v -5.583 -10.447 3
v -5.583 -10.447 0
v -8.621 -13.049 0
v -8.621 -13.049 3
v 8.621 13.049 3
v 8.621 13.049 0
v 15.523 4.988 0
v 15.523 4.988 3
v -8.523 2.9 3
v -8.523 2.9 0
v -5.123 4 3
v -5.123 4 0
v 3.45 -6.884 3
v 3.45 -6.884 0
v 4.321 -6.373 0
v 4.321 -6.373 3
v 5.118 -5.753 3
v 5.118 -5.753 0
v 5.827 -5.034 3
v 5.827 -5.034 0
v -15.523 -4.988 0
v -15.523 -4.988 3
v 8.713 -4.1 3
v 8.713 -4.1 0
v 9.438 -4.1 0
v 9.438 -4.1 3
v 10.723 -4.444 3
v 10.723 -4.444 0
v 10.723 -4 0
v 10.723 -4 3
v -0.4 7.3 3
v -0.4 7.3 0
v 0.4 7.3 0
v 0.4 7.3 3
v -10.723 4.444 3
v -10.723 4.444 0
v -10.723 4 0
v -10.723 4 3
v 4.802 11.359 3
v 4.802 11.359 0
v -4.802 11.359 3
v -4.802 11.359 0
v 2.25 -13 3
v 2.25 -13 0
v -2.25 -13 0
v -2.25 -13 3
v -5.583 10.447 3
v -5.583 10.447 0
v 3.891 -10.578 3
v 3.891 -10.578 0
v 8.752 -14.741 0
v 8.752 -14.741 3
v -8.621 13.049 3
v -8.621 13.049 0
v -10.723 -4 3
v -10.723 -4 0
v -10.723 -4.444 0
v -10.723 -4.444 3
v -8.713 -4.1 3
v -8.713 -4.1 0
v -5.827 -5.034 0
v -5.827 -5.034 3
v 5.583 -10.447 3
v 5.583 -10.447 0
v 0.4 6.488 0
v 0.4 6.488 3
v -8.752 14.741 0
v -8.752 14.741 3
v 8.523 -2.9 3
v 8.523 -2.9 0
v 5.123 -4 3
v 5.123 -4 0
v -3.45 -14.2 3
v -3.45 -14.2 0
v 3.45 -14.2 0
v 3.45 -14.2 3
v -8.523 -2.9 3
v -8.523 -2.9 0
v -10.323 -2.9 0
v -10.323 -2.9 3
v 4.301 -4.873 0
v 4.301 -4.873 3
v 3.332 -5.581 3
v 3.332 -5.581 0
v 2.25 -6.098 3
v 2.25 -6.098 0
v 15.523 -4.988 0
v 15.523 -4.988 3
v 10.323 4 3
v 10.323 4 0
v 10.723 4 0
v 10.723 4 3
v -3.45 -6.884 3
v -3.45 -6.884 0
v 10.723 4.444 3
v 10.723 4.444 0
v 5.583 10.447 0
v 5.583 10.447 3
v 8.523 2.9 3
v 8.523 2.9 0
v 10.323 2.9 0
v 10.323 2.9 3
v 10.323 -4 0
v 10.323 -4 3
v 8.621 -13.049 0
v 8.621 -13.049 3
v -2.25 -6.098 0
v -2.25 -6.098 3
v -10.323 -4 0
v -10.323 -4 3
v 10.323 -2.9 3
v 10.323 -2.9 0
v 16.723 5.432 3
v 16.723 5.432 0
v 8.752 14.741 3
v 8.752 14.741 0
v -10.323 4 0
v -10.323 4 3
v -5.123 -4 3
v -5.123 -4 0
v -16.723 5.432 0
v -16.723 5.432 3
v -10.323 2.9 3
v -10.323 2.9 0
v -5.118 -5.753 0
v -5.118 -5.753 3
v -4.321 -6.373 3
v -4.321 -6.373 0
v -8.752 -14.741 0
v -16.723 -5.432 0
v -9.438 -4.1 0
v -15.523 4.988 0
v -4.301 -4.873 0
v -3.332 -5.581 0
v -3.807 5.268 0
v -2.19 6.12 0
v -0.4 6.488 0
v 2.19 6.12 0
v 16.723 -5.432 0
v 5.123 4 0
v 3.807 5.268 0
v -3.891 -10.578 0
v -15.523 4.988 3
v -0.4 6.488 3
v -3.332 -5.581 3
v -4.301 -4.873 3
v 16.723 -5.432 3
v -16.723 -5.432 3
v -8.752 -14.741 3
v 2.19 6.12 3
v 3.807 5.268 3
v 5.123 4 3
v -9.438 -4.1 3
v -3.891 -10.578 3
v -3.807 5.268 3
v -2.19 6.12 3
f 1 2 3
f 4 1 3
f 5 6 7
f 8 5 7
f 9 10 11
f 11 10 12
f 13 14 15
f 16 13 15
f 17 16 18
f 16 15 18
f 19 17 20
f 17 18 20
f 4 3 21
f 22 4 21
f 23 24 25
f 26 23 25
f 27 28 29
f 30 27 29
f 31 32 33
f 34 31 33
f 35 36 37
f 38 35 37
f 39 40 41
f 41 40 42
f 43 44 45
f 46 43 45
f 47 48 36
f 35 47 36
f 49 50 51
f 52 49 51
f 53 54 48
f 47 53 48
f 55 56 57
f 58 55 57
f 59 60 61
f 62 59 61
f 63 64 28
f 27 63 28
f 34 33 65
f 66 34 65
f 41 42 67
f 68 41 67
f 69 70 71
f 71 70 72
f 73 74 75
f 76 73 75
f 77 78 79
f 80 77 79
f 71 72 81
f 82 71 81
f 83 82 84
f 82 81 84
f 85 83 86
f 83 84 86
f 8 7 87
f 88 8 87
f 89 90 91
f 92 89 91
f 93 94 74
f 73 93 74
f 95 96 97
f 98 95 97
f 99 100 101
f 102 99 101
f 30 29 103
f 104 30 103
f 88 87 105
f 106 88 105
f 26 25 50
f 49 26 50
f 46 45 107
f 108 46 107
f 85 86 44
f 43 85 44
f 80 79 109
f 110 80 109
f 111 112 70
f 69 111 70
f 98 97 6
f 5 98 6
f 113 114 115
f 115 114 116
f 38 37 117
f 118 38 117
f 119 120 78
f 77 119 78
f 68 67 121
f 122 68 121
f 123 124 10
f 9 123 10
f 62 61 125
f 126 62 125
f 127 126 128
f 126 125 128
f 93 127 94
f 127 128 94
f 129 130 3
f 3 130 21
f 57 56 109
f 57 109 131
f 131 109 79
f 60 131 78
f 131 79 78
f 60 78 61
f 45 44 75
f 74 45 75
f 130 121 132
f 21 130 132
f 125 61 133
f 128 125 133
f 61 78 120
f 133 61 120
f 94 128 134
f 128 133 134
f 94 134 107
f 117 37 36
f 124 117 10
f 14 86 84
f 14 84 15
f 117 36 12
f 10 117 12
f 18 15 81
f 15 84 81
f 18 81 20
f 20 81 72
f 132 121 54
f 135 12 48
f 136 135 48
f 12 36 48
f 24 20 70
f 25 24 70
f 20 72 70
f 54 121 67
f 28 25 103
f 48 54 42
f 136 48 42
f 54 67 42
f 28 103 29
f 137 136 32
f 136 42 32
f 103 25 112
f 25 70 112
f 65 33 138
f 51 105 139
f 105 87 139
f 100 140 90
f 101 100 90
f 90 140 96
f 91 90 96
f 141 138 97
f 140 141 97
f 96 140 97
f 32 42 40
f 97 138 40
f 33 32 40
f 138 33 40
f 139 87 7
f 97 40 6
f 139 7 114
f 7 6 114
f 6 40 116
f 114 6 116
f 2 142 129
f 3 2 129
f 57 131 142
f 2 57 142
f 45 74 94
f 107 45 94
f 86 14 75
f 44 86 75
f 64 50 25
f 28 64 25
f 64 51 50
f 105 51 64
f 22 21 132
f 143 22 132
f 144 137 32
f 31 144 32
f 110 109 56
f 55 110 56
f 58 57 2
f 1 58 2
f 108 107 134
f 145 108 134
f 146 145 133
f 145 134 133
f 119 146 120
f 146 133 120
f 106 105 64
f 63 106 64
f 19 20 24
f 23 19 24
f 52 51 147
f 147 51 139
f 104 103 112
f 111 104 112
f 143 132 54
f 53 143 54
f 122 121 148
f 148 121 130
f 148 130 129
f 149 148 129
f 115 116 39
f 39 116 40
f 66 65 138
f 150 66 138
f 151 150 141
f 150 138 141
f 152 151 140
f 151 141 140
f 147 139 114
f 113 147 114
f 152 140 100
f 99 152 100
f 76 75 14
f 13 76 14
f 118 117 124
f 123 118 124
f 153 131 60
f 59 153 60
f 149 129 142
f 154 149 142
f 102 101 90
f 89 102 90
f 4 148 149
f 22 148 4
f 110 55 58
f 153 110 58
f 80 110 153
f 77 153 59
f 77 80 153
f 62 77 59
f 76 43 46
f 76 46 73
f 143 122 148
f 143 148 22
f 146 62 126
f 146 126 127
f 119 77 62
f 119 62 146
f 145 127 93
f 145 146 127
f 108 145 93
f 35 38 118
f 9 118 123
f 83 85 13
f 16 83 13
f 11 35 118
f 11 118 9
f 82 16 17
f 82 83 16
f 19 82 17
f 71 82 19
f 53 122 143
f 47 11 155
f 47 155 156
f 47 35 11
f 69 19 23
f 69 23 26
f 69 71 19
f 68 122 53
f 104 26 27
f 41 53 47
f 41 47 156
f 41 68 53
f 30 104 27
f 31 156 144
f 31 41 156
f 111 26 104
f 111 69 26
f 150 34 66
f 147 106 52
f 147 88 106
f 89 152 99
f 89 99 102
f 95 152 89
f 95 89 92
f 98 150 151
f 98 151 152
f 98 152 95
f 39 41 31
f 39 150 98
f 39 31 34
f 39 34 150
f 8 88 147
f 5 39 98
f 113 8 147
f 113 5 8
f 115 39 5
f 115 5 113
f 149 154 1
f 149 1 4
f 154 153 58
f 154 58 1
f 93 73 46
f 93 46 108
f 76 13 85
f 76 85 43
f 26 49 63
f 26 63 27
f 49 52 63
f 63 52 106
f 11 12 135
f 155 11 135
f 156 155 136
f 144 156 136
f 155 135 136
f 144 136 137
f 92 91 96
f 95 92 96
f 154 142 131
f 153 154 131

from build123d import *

# Parameters (mm, degrees)
F1_DEPTH = 3


with BuildPart() as f1:
    # F0 (on Top) → F1 (new body)
    with BuildSketch(Plane.XY):
        with BuildLine():
            Line((16.723475, 5.431714), (8.751905, 14.74098))
            Line((8.751905, 14.74098), (4.802136, 11.358773))
            Line((4.802136, 11.358773), (-4.802136, 11.358773))
            Line((-4.802136, 11.358773), (-8.751905, 14.740979))
            Line((-8.751905, 14.740979), (-16.723475, 5.431713))
            Line((-16.723475, 5.431713), (-16.723475, 0))
            Line((-16.723475, 0), (-16.723475, -5.431713))
            Line((-16.723475, -5.431713), (-8.751905, -14.740979))
            Line((-8.751905, -14.740979), (-3.890651, -10.578264))
            Line((-3.890651, -10.578264), (-9.43802, -4.1))
            Line((-9.43802, -4.1), (-8.712763, -4.1))
            Line((-8.712763, -4.1), (-5.826839, -5.033681))
            ThreePointArc((-5.826839, -5.033681), (-4.72977, -6.076123), (-3.45, -6.883858))
            Line((-3.45, -6.883858), (-3.45, -14.2))
            Line((-3.45, -14.2), (3.45, -14.2))
            Line((3.45, -14.2), (3.45, -6.883857))
            ThreePointArc((3.45, -6.883857), (4.72977, -6.076123), (5.826838, -5.033681))
            Line((5.826838, -5.033681), (8.712763, -4.099999))
            Line((8.712763, -4.099999), (9.43802, -4.099999))
            Line((9.43802, -4.099999), (3.890651, -10.578264))
            Line((3.890651, -10.578264), (8.751905, -14.74098))
            Line((8.751905, -14.74098), (16.723475, -5.431714))
            Line((16.723475, -5.431714), (16.723475, 0))
            Line((16.723475, 0), (16.723475, 5.431714))
        make_face()
        with BuildLine():
            ThreePointArc((-2.25, -6.098155), (-3.833093, -5.249514), (-5.123475, -4))
            Line((-5.123475, -4), (-8.523475, -2.9))
            Line((-8.523475, -2.9), (-10.323475, -2.9))
            Line((-10.323475, -2.9), (-10.323475, -4))
            Line((-10.323475, -4), (-10.723475, -4))
            Line((-10.723475, -4), (-10.723475, -4.443783))
            Line((-10.723475, -4.443783), (-5.582645, -10.447288))
            Line((-5.582645, -10.447288), (-8.620929, -13.048985))
            Line((-8.620929, -13.048985), (-15.523475, -4.988134))
            Line((-15.523475, -4.988134), (-15.523475, 0))
            Line((-15.523475, 0), (-15.523475, 4.988134))
            Line((-15.523475, 4.988134), (-8.620929, 13.048985))
            Line((-8.620929, 13.048985), (-5.582645, 10.447288))
            Line((-5.582645, 10.447288), (-10.723475, 4.443783))
            Line((-10.723475, 4.443783), (-10.723475, 4))
            Line((-10.723475, 4), (-10.323475, 4))
            Line((-10.323475, 4), (-10.323475, 2.9))
            Line((-10.323475, 2.9), (-8.523475, 2.9))
            Line((-8.523475, 2.9), (-5.123475, 4))
            ThreePointArc((-5.123475, 4), (-3.028916, 5.751145), (-0.4, 6.487681))
            Line((-0.4, 6.487681), (-0.4, 7.3))
            Line((-0.4, 7.3), (0, 7.3))
            Line((0, 7.3), (0.4, 7.3))
            Line((0.4, 7.3), (0.4, 6.487681))
            ThreePointArc((0.4, 6.487681), (3.028916, 5.751145), (5.123475, 4))
            Line((5.123475, 4), (8.523475, 2.9))
            Line((8.523475, 2.9), (10.323475, 2.9))
            Line((10.323475, 2.9), (10.323475, 4))
            Line((10.323475, 4), (10.723475, 4))
            Line((10.723475, 4), (10.723475, 4.443783))
            Line((10.723475, 4.443783), (5.582645, 10.447288))
            Line((5.582645, 10.447288), (8.620929, 13.048985))
            Line((8.620929, 13.048985), (15.523475, 4.988134))
            Line((15.523475, 4.988134), (15.523475, 0))
            Line((15.523475, 0), (15.523475, -4.988134))
            Line((15.523475, -4.988134), (8.620929, -13.048985))
            Line((8.620929, -13.048985), (5.582645, -10.447288))
            Line((5.582645, -10.447288), (10.723475, -4.443783))
            Line((10.723475, -4.443783), (10.723475, -4))
            Line((10.723475, -4), (10.323475, -4))
            Line((10.323475, -4), (10.323475, -2.9))
            Line((10.323475, -2.9), (8.523475, -2.9))
            Line((8.523475, -2.9), (5.123475, -4))
            ThreePointArc((5.123475, -4), (3.833093, -5.249514), (2.25, -6.098155))
            Line((2.25, -6.098155), (2.25, -13))
            Line((2.25, -13), (-2.25, -13))
            Line((-2.25, -13), (-2.25, -6.098155))
        make_face(mode=Mode.SUBTRACT)
    extrude(amount=F1_DEPTH)


solid = f1.part
